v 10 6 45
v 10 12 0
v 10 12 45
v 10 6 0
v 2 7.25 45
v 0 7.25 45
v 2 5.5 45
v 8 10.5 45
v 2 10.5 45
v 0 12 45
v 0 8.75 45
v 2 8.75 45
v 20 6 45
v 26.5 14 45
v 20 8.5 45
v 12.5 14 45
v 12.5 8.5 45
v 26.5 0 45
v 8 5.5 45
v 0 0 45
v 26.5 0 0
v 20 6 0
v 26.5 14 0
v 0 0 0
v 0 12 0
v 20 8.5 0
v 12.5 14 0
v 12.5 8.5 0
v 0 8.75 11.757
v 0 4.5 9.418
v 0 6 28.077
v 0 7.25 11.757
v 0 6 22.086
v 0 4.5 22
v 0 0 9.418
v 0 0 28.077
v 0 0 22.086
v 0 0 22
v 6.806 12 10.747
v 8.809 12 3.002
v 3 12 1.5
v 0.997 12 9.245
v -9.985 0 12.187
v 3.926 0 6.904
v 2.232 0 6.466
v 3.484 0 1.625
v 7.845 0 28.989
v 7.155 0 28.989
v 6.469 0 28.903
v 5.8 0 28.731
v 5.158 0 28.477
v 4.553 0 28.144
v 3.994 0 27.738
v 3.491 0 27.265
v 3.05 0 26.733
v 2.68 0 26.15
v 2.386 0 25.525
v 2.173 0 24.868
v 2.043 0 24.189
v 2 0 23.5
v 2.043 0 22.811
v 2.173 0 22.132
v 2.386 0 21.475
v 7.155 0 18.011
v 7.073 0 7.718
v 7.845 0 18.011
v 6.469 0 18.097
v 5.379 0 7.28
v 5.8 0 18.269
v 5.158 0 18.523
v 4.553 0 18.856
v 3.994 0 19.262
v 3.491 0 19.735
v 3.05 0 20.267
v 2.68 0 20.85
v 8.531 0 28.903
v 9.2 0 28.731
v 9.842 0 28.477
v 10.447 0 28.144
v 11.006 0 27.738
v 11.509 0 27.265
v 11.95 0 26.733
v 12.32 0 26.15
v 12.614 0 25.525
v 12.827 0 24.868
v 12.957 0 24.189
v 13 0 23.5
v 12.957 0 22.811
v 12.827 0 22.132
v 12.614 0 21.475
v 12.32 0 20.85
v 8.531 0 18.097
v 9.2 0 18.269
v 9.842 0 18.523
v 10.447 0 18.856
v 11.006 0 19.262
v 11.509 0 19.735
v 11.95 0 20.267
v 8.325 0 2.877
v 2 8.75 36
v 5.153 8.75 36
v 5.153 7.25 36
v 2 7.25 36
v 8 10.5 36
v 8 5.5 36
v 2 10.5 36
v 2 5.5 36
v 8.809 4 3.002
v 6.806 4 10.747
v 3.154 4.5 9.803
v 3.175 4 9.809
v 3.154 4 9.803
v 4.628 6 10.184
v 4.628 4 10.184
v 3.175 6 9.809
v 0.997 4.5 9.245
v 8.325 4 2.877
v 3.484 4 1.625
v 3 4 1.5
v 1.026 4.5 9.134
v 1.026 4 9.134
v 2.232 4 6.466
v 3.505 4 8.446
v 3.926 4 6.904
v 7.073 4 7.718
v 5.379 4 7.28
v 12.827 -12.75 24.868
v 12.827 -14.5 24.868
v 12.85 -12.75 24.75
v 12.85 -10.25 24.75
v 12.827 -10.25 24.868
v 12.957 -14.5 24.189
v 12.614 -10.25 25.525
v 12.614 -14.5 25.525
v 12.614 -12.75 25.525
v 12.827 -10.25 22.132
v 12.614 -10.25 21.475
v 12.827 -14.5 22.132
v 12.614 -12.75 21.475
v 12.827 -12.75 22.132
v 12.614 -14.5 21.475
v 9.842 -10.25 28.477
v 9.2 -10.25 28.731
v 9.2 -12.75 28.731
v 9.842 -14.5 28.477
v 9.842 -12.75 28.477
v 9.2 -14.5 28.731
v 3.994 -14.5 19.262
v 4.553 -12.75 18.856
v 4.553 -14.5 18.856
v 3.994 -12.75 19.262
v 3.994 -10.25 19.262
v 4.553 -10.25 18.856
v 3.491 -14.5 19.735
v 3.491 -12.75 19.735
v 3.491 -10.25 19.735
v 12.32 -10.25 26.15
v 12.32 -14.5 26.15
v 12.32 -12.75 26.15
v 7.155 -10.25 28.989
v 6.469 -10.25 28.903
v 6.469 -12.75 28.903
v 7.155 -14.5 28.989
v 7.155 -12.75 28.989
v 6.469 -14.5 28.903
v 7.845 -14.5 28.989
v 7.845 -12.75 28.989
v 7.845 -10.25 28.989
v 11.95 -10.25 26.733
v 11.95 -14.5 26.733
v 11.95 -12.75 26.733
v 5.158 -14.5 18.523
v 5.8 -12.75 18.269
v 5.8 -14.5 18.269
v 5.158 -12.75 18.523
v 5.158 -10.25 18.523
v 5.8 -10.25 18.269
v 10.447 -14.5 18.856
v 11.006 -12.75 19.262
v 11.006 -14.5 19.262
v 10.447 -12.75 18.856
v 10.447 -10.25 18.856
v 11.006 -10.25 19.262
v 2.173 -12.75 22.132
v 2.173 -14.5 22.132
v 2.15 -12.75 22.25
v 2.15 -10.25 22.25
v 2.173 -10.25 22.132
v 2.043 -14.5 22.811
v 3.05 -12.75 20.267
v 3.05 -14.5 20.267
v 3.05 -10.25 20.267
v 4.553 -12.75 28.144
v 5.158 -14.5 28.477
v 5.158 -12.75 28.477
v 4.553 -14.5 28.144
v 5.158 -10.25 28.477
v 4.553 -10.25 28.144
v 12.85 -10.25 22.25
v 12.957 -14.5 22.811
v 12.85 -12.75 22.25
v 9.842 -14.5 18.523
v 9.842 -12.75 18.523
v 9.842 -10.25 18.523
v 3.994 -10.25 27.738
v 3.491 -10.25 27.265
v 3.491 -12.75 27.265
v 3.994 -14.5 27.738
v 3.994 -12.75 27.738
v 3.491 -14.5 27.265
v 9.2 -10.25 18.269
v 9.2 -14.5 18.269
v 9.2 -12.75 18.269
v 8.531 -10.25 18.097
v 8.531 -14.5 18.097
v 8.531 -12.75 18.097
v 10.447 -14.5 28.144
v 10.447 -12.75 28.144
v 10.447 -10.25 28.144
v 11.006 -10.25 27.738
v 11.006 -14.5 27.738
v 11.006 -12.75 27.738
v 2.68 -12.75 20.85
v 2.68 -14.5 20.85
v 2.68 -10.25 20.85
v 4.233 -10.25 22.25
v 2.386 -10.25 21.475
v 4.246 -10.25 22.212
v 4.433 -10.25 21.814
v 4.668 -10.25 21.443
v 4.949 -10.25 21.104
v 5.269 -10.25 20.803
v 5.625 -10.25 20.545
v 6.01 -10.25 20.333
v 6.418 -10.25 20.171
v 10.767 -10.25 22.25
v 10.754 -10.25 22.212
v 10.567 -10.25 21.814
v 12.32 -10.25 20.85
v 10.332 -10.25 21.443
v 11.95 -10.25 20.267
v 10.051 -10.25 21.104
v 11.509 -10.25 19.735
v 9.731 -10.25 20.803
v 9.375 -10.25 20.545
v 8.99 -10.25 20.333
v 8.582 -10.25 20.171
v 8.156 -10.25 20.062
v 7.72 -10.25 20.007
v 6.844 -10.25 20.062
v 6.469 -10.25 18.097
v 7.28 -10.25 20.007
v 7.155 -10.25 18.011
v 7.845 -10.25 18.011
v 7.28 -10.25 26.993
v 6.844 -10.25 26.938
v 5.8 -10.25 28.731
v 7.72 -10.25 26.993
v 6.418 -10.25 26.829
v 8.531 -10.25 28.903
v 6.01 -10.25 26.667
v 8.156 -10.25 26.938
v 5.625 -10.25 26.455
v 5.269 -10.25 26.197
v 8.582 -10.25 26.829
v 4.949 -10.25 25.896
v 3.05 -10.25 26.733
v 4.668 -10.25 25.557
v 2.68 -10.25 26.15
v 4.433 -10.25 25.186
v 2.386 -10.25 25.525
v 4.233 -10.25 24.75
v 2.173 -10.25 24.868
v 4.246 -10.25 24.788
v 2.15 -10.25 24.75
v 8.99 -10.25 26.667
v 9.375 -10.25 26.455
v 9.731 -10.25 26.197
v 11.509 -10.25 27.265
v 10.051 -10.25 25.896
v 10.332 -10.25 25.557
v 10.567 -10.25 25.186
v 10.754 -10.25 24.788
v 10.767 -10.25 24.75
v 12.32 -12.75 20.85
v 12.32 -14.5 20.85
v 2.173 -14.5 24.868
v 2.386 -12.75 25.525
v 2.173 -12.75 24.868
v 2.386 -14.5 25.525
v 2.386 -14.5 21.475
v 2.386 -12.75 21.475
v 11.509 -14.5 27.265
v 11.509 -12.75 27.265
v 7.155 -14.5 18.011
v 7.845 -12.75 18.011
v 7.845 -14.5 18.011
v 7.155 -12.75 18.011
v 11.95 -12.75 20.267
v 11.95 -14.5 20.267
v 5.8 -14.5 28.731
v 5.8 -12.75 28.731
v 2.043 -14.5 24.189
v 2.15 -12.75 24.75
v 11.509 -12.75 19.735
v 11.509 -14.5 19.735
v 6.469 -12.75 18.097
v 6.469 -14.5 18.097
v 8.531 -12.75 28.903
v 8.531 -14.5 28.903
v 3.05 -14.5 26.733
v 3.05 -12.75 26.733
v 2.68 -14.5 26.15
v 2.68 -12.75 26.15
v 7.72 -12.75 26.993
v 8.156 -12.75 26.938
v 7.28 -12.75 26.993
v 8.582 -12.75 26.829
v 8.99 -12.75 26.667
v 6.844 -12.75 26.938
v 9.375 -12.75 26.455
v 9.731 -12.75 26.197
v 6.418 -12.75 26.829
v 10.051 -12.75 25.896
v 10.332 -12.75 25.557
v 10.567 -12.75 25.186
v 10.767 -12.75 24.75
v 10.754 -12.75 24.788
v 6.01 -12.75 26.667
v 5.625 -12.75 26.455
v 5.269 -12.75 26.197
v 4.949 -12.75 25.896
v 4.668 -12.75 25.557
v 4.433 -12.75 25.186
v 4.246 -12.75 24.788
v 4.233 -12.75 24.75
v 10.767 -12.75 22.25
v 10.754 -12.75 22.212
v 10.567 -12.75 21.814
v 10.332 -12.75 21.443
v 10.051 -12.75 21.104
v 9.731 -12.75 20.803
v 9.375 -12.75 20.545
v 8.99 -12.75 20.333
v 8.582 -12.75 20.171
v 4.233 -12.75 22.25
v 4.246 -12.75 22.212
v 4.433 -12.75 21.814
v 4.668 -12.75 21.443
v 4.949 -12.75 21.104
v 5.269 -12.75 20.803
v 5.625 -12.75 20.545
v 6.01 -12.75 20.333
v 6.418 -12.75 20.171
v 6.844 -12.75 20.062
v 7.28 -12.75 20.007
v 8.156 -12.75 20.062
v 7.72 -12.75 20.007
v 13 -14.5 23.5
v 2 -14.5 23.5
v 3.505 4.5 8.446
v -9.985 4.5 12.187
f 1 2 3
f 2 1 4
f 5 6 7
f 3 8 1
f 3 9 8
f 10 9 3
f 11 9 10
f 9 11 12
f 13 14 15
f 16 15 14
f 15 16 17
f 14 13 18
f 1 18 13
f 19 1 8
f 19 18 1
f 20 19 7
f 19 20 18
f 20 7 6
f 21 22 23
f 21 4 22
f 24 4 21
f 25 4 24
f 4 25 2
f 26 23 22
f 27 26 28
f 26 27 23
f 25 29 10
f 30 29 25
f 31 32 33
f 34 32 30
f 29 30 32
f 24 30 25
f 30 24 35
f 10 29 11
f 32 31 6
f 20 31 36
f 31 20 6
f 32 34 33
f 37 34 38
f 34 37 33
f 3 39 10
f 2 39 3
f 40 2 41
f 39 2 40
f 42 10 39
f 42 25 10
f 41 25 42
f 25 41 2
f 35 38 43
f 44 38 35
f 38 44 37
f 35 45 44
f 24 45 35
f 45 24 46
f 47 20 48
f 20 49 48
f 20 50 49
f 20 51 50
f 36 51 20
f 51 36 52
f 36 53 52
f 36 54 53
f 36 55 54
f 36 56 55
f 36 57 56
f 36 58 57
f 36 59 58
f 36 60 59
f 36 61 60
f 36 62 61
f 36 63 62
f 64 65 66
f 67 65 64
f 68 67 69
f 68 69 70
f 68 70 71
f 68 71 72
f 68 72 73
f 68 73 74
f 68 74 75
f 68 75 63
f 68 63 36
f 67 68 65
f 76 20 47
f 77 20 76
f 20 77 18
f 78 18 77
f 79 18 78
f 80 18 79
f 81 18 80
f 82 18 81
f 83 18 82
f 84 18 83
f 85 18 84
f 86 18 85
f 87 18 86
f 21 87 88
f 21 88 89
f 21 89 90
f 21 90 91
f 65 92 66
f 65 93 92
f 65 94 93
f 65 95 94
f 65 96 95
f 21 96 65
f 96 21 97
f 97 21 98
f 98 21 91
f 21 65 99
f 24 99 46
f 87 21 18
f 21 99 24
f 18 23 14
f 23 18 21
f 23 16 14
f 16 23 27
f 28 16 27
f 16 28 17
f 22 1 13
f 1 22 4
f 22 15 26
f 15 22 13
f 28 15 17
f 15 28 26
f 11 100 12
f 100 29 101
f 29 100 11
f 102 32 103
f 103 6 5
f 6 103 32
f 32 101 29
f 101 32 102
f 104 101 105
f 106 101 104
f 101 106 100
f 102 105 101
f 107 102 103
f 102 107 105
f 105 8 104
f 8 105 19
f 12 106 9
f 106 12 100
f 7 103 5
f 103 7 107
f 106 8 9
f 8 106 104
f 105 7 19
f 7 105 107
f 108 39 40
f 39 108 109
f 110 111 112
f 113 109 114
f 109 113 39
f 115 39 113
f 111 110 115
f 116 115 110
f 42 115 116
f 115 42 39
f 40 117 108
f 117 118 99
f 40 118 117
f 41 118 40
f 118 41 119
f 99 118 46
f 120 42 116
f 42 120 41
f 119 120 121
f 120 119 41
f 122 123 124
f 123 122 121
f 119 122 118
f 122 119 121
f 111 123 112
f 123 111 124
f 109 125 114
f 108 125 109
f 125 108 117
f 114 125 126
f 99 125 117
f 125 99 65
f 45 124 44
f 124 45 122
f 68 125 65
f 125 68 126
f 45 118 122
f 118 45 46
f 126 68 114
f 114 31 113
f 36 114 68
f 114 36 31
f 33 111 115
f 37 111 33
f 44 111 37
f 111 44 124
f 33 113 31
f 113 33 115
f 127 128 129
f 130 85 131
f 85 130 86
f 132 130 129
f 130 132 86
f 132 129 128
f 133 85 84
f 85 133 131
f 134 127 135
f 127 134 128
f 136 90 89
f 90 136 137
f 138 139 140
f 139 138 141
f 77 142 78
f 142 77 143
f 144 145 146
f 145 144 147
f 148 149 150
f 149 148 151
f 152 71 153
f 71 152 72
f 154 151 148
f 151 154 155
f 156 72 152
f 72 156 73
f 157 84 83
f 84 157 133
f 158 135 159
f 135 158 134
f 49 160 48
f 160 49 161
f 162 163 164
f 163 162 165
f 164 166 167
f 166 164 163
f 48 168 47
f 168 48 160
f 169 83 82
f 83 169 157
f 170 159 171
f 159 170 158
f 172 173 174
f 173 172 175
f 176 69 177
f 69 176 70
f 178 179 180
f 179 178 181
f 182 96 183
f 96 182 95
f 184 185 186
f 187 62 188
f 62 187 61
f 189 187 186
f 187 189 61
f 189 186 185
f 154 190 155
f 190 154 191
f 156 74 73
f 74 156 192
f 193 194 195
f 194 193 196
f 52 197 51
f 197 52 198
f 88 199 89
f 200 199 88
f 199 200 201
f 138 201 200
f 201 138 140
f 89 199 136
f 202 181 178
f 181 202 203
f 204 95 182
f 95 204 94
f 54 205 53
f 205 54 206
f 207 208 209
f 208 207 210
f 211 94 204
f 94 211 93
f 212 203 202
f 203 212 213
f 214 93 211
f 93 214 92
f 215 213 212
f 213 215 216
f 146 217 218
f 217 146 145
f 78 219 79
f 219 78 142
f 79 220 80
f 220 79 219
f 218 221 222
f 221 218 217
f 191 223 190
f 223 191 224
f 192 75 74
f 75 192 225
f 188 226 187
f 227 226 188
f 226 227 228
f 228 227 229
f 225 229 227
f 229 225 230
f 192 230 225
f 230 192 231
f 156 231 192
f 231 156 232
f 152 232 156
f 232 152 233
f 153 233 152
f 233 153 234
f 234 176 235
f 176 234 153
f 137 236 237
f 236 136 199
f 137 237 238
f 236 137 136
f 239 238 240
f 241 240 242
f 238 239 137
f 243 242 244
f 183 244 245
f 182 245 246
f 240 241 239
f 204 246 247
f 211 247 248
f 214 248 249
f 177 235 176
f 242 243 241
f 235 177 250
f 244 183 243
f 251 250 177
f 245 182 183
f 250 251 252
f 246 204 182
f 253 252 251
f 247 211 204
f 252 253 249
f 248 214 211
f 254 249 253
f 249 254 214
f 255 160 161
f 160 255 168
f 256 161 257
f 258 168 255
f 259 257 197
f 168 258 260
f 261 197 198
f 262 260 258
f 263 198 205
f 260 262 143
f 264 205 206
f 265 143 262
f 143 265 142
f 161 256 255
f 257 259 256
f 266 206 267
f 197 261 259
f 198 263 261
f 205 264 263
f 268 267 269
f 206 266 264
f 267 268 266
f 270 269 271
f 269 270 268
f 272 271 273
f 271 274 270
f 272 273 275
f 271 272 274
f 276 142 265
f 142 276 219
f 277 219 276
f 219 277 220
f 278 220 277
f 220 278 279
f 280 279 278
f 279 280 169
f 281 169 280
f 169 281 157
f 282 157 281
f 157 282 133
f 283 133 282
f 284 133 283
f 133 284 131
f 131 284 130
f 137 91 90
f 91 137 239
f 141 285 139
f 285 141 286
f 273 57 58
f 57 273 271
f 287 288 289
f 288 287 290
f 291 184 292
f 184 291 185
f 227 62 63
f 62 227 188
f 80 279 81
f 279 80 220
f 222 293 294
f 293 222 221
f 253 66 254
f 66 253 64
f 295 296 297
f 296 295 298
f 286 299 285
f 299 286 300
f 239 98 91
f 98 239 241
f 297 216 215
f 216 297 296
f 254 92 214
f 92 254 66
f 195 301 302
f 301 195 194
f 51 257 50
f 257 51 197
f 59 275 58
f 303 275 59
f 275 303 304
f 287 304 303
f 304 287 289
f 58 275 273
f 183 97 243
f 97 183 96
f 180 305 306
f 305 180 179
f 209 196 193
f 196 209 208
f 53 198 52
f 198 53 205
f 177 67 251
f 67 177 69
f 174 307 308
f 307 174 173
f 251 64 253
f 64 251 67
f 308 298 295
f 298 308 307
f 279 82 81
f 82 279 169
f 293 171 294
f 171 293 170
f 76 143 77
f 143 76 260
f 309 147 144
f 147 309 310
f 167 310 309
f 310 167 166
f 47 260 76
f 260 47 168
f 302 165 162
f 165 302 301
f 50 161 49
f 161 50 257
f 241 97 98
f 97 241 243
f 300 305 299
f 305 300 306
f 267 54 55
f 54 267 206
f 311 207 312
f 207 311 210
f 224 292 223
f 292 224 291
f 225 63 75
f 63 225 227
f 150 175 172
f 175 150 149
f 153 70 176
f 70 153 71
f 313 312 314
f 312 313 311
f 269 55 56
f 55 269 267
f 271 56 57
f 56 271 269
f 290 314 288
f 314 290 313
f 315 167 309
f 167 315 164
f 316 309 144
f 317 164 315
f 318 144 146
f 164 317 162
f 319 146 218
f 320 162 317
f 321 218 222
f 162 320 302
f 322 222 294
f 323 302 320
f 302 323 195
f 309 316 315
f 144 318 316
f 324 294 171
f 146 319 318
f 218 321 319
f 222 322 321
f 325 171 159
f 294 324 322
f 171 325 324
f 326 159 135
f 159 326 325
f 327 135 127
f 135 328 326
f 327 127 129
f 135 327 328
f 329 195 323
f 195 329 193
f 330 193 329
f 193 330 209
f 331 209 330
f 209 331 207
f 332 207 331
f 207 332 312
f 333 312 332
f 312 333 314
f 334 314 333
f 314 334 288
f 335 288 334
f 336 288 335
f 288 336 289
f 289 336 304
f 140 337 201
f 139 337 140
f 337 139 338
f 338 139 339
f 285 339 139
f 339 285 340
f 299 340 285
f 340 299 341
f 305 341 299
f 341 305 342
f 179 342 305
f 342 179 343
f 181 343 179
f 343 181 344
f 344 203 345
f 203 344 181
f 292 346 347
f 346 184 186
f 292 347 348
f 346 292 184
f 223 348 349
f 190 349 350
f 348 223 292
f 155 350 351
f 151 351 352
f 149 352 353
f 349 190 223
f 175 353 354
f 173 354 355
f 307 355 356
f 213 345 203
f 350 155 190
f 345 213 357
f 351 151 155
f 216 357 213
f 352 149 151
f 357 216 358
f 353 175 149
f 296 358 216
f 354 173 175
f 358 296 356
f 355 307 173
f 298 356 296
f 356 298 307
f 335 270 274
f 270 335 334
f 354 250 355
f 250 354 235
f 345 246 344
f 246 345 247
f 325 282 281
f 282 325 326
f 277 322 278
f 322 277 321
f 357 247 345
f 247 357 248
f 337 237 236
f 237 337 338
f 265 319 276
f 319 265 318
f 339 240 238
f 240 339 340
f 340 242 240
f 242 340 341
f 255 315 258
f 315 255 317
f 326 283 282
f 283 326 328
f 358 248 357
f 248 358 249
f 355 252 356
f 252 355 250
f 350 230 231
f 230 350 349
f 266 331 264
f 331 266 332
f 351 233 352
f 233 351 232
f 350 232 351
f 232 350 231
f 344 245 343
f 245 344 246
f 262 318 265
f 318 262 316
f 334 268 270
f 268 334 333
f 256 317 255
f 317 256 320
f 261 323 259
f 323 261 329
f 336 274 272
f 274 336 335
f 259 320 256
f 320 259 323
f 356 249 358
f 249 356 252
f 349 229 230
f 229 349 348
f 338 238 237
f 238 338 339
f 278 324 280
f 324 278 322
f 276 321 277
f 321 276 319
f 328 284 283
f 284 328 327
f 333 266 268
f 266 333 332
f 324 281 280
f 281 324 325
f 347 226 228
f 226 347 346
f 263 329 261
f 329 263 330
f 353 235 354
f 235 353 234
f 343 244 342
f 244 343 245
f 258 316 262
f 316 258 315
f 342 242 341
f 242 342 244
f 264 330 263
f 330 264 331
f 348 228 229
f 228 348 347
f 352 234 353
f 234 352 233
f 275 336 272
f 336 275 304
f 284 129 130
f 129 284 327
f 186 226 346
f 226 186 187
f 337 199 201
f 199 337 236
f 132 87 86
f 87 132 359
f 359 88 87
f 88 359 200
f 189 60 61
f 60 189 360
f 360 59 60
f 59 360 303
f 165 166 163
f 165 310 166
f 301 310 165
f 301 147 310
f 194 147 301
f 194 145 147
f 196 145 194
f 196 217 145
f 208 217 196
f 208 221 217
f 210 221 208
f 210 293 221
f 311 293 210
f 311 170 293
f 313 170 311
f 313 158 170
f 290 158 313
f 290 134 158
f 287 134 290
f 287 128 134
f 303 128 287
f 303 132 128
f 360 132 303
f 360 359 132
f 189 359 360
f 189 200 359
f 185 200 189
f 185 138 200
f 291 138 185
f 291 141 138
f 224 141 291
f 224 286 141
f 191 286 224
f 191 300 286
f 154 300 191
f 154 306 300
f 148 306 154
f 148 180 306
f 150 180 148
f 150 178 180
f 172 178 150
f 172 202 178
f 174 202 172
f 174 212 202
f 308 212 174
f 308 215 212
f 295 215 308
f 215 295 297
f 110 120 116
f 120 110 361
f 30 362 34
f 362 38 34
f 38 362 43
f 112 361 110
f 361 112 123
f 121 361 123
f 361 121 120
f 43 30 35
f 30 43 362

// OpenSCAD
$fn = 50;

width_cable = 10;
depth_cable = 12;

width = 26.5;
height = 45;

depth_hang = 14;

hole1_width = 10;

hole2_depth = 8;

hole_size = 2.5;

cube_hole1_width = 6;
cube_hole1_depth = 5;
cube_hole1_height = 9;

cube_hole2_width = 6;
cube_hole2_depth = 8;
cube_hole2_height = 8;

hole1_distance_from_bottom = 5.5;

hole2_distance_width = 3;
hole2_distance_depth = 1.5;
hole2_distance_height = 1.5;

cube_hole3_width = 5;
cube_hole3_depth = depth_cable;
cube_hole3_height = 5;

slit2_height = 45;
slit2_width = 1.5;
slit2_depth = 6;

slit1_height = 45;
slit1_width = 7;
slit1_depth = 1.5;

stick_d = 11;
stick_height = 14.5;

stick_distance_width = 7.5;
stick_distance_height = 23.5;

tube_height = 2.5;
tube_d = 7;
tube_spare = 3;

tube_distance_height = 3;

tri_a = 14;
tri_depth = 4.5;

tri_distance_height = 22;

rotate1 = 14.5;


difference() {
    base_whole();
    union() {
        hole1();
        hole2();
    };
};
stick();
triangle();

module stick() {
    translate([stick_distance_width, -stick_height/2, stick_distance_height])
    rotate([90, 0, 0])
    difference() {
        cylinder(r1=stick_d/2, r2=stick_d/2, h=stick_height, center=true);
        tube();
    };
};

module slit2() {
    cube([slit2_width, slit2_depth, slit2_height]);
};

module triangle() {
    h = tri_a * 0.866;
    translate([0, tri_depth, tri_distance_height])
    rotate([90, 180-rotate1, 0])
    linear_extrude(height=tri_depth)
    polygon([[0, 0], [h, tri_a/2], [0, tri_a]]);
};

module tube() {
    translate([0, 0, (stick_height/2)-tube_distance_height])
    difference() {
        cylinder(r1=stick_d/2, r2=stick_d/2, h=tube_height, center=true);
        cylinder(r1=tube_d/2, r2=tube_d/2, h=tube_height, center=true);
        cube([stick_d, tube_height, stick_height], center=true);
    };
};

module slit1() {
    translate([0, (cube_hole1_depth-slit1_depth)/2, 2])
    rotate([0, 12, 0])
    translate([-slit1_width/2, 0, -slit1_height])
    cube([slit1_width, slit1_depth, slit1_height]);
    translate([-(width_cable-cube_hole1_width-2), (cube_hole1_depth-slit1_depth)/2, 0])
    cube([slit1_width, slit1_depth, slit1_height]);
};

module hole1() {
    translate([width_cable-cube_hole1_width-2 ,  hole1_distance_from_bottom, height-cube_hole1_height]) {
        cube([cube_hole1_width, cube_hole1_depth, cube_hole1_height]);
        slit1();
    };
};

module hole2() {
    translate([hole2_distance_width, hole2_distance_depth, hole2_distance_height])
    rotate([0,-rotate1,0])
    union() {
        translate([0, depth_cable-cube_hole2_depth-hole2_distance_depth, 0])
        cube([cube_hole2_width, cube_hole2_depth, cube_hole2_height]);
        translate([-(cube_hole3_width-cube_hole2_width)/2, -hole2_distance_depth, 0])
        cube([cube_hole3_width, cube_hole3_depth, cube_hole3_height]);
        translate([(cube_hole2_width-slit2_width)/2, -hole2_distance_depth, 0])
        slit2();
    };
};

module base_whole() {
    difference() {
        base();
        union() {
            translate([width_cable, depth_hang-hole2_depth, 0])
            cube([hole_size, hole2_depth, height]);
            translate([width_cable, depth_hang-hole2_depth, 0])
            cube([hole1_width, hole_size, height]);
        };
    };
};


module base() {
    union() {
        cube([width_cable, depth_cable, height]);
        translate([width_cable, 0, 0])
        cube([width-width_cable, depth_hang, height]);
    };
};
